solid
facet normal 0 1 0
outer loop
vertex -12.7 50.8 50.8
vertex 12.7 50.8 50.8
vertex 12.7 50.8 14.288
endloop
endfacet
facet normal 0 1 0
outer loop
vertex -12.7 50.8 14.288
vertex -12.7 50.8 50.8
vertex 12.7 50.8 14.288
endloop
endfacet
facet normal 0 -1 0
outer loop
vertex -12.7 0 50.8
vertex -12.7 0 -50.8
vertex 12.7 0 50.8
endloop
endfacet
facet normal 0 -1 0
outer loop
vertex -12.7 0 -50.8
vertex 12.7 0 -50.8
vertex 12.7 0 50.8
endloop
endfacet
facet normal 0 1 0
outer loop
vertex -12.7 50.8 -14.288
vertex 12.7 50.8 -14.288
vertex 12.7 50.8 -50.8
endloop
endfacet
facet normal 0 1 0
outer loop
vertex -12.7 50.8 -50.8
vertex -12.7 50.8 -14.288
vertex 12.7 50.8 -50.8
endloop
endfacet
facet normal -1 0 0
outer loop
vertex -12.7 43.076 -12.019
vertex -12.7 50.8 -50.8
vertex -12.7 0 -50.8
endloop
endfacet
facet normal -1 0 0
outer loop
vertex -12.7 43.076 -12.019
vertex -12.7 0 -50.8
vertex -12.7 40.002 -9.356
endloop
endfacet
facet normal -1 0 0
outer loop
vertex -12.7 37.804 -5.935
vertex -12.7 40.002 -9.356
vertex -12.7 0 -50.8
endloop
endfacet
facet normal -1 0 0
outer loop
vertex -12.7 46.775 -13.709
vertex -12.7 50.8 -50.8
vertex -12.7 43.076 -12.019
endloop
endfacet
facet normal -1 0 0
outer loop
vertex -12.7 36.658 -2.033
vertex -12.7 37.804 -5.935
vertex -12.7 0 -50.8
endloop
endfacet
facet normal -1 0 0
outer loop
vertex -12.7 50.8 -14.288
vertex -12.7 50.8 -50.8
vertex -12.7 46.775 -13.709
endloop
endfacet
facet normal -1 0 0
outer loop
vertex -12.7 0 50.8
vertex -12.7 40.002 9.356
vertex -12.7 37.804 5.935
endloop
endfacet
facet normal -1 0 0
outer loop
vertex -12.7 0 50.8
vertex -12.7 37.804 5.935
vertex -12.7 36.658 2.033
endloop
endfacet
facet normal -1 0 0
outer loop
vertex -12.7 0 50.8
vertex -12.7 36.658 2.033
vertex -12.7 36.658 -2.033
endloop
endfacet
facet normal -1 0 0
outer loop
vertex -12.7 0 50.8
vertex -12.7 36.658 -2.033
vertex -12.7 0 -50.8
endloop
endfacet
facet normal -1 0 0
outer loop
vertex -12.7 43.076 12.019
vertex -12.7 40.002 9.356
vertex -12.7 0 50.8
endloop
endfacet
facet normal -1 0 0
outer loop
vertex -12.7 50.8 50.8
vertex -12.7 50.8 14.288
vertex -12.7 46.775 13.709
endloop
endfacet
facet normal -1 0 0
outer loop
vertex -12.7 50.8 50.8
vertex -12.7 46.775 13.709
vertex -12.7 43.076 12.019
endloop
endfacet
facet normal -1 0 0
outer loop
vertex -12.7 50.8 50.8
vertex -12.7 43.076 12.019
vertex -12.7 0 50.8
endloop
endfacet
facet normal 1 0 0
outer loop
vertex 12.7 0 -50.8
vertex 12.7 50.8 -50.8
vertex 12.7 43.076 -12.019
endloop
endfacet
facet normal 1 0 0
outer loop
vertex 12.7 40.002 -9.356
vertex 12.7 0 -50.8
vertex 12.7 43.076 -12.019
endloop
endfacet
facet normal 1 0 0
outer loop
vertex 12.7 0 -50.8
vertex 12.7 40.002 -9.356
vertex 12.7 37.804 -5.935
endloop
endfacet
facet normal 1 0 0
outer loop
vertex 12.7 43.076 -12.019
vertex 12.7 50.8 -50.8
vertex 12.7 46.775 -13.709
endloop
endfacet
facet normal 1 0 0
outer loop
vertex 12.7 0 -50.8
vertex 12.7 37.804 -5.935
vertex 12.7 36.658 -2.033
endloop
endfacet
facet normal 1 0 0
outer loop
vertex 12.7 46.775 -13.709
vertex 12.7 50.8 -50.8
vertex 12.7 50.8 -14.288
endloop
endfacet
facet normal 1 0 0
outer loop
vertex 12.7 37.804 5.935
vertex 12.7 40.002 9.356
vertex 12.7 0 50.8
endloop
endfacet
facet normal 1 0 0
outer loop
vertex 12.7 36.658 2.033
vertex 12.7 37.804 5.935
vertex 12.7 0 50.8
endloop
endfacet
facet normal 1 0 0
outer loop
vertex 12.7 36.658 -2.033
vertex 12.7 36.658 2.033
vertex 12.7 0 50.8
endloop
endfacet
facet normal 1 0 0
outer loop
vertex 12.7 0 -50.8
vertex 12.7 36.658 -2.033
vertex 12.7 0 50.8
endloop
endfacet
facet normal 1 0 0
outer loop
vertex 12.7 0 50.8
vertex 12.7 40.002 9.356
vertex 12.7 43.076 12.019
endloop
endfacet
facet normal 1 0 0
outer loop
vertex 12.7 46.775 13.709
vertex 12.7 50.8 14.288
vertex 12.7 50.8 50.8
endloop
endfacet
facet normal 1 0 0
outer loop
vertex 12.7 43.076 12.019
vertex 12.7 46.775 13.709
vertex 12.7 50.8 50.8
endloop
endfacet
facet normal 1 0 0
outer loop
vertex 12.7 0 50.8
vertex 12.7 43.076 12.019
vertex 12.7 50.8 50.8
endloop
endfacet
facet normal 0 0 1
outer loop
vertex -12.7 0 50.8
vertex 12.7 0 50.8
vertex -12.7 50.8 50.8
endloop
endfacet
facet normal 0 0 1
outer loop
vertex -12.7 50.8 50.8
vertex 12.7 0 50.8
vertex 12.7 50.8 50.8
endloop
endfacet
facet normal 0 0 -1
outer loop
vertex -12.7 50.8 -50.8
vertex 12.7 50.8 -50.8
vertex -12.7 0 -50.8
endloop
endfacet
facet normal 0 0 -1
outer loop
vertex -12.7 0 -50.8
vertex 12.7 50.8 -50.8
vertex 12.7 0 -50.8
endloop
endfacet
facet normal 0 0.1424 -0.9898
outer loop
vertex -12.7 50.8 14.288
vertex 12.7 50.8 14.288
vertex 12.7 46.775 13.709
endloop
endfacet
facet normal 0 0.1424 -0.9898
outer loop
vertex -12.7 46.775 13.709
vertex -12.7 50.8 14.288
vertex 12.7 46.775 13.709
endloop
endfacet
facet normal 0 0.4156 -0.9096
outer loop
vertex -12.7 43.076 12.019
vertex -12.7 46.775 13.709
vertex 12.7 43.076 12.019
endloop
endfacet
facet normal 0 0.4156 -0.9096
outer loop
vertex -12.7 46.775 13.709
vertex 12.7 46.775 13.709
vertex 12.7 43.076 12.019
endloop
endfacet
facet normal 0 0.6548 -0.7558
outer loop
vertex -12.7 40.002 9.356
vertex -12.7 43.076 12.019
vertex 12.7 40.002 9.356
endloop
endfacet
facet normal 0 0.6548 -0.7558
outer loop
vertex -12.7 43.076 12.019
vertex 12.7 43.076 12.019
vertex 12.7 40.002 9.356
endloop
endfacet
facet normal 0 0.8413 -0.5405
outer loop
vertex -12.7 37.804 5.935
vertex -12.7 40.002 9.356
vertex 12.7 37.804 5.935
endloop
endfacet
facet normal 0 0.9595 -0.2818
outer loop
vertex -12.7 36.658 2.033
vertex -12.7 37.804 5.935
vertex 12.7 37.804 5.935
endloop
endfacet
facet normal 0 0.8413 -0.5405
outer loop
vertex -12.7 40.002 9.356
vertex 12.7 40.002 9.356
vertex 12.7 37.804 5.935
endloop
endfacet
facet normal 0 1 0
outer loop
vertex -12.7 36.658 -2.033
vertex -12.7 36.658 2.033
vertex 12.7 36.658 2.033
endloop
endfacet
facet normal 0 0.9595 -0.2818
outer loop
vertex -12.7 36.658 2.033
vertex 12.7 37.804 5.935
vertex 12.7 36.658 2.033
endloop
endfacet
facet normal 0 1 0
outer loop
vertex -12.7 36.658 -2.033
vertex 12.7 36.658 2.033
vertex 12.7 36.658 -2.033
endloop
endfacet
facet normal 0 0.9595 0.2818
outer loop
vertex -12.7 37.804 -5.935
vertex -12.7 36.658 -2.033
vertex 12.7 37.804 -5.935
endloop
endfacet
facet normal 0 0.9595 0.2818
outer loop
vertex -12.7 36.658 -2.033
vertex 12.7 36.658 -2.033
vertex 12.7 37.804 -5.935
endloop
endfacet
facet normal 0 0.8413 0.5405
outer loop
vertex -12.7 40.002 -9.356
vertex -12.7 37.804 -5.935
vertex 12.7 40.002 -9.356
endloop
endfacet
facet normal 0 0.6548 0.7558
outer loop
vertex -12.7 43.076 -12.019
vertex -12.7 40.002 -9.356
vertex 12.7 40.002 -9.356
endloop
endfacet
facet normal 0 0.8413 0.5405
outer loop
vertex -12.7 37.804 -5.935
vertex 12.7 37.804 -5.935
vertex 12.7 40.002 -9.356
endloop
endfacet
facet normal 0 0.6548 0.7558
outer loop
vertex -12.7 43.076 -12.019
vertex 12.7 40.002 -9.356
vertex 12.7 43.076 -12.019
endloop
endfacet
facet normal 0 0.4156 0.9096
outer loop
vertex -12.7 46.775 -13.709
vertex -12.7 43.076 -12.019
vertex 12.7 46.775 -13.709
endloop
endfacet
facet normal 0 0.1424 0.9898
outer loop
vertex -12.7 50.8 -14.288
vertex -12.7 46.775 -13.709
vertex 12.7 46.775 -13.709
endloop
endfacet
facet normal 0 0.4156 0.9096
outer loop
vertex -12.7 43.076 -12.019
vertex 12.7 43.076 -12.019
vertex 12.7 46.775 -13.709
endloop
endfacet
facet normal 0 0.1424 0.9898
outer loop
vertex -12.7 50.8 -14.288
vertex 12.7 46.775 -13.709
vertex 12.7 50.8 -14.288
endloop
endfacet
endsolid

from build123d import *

# Parameters (mm, degrees)
BOSS_EXTRUDE1_DEPTH = 12.7


with BuildPart() as part:
    # Sketch1 → Boss-Extrude1 (new body, symmetric)
    with BuildSketch(Plane(origin=(0, 0, 0), x_dir=(0, 0, -1), z_dir=(1, 0, 0))):
        with BuildLine():
            Line((14.2875, 50.8), (50.8, 50.8))
            Line((50.8, 50.8), (50.8, 0))
            Line((50.8, 0), (-50.8, 0))
            Line((-50.8, 0), (-50.8, 50.8))
            Line((-50.8, 50.8), (-14.2875, 50.8))
            ThreePointArc((-14.2875, 50.8), (0, 36.5125), (14.2875, 50.8))
        make_face()
    extrude(amount=BOSS_EXTRUDE1_DEPTH, both=True)


solid = part.part
